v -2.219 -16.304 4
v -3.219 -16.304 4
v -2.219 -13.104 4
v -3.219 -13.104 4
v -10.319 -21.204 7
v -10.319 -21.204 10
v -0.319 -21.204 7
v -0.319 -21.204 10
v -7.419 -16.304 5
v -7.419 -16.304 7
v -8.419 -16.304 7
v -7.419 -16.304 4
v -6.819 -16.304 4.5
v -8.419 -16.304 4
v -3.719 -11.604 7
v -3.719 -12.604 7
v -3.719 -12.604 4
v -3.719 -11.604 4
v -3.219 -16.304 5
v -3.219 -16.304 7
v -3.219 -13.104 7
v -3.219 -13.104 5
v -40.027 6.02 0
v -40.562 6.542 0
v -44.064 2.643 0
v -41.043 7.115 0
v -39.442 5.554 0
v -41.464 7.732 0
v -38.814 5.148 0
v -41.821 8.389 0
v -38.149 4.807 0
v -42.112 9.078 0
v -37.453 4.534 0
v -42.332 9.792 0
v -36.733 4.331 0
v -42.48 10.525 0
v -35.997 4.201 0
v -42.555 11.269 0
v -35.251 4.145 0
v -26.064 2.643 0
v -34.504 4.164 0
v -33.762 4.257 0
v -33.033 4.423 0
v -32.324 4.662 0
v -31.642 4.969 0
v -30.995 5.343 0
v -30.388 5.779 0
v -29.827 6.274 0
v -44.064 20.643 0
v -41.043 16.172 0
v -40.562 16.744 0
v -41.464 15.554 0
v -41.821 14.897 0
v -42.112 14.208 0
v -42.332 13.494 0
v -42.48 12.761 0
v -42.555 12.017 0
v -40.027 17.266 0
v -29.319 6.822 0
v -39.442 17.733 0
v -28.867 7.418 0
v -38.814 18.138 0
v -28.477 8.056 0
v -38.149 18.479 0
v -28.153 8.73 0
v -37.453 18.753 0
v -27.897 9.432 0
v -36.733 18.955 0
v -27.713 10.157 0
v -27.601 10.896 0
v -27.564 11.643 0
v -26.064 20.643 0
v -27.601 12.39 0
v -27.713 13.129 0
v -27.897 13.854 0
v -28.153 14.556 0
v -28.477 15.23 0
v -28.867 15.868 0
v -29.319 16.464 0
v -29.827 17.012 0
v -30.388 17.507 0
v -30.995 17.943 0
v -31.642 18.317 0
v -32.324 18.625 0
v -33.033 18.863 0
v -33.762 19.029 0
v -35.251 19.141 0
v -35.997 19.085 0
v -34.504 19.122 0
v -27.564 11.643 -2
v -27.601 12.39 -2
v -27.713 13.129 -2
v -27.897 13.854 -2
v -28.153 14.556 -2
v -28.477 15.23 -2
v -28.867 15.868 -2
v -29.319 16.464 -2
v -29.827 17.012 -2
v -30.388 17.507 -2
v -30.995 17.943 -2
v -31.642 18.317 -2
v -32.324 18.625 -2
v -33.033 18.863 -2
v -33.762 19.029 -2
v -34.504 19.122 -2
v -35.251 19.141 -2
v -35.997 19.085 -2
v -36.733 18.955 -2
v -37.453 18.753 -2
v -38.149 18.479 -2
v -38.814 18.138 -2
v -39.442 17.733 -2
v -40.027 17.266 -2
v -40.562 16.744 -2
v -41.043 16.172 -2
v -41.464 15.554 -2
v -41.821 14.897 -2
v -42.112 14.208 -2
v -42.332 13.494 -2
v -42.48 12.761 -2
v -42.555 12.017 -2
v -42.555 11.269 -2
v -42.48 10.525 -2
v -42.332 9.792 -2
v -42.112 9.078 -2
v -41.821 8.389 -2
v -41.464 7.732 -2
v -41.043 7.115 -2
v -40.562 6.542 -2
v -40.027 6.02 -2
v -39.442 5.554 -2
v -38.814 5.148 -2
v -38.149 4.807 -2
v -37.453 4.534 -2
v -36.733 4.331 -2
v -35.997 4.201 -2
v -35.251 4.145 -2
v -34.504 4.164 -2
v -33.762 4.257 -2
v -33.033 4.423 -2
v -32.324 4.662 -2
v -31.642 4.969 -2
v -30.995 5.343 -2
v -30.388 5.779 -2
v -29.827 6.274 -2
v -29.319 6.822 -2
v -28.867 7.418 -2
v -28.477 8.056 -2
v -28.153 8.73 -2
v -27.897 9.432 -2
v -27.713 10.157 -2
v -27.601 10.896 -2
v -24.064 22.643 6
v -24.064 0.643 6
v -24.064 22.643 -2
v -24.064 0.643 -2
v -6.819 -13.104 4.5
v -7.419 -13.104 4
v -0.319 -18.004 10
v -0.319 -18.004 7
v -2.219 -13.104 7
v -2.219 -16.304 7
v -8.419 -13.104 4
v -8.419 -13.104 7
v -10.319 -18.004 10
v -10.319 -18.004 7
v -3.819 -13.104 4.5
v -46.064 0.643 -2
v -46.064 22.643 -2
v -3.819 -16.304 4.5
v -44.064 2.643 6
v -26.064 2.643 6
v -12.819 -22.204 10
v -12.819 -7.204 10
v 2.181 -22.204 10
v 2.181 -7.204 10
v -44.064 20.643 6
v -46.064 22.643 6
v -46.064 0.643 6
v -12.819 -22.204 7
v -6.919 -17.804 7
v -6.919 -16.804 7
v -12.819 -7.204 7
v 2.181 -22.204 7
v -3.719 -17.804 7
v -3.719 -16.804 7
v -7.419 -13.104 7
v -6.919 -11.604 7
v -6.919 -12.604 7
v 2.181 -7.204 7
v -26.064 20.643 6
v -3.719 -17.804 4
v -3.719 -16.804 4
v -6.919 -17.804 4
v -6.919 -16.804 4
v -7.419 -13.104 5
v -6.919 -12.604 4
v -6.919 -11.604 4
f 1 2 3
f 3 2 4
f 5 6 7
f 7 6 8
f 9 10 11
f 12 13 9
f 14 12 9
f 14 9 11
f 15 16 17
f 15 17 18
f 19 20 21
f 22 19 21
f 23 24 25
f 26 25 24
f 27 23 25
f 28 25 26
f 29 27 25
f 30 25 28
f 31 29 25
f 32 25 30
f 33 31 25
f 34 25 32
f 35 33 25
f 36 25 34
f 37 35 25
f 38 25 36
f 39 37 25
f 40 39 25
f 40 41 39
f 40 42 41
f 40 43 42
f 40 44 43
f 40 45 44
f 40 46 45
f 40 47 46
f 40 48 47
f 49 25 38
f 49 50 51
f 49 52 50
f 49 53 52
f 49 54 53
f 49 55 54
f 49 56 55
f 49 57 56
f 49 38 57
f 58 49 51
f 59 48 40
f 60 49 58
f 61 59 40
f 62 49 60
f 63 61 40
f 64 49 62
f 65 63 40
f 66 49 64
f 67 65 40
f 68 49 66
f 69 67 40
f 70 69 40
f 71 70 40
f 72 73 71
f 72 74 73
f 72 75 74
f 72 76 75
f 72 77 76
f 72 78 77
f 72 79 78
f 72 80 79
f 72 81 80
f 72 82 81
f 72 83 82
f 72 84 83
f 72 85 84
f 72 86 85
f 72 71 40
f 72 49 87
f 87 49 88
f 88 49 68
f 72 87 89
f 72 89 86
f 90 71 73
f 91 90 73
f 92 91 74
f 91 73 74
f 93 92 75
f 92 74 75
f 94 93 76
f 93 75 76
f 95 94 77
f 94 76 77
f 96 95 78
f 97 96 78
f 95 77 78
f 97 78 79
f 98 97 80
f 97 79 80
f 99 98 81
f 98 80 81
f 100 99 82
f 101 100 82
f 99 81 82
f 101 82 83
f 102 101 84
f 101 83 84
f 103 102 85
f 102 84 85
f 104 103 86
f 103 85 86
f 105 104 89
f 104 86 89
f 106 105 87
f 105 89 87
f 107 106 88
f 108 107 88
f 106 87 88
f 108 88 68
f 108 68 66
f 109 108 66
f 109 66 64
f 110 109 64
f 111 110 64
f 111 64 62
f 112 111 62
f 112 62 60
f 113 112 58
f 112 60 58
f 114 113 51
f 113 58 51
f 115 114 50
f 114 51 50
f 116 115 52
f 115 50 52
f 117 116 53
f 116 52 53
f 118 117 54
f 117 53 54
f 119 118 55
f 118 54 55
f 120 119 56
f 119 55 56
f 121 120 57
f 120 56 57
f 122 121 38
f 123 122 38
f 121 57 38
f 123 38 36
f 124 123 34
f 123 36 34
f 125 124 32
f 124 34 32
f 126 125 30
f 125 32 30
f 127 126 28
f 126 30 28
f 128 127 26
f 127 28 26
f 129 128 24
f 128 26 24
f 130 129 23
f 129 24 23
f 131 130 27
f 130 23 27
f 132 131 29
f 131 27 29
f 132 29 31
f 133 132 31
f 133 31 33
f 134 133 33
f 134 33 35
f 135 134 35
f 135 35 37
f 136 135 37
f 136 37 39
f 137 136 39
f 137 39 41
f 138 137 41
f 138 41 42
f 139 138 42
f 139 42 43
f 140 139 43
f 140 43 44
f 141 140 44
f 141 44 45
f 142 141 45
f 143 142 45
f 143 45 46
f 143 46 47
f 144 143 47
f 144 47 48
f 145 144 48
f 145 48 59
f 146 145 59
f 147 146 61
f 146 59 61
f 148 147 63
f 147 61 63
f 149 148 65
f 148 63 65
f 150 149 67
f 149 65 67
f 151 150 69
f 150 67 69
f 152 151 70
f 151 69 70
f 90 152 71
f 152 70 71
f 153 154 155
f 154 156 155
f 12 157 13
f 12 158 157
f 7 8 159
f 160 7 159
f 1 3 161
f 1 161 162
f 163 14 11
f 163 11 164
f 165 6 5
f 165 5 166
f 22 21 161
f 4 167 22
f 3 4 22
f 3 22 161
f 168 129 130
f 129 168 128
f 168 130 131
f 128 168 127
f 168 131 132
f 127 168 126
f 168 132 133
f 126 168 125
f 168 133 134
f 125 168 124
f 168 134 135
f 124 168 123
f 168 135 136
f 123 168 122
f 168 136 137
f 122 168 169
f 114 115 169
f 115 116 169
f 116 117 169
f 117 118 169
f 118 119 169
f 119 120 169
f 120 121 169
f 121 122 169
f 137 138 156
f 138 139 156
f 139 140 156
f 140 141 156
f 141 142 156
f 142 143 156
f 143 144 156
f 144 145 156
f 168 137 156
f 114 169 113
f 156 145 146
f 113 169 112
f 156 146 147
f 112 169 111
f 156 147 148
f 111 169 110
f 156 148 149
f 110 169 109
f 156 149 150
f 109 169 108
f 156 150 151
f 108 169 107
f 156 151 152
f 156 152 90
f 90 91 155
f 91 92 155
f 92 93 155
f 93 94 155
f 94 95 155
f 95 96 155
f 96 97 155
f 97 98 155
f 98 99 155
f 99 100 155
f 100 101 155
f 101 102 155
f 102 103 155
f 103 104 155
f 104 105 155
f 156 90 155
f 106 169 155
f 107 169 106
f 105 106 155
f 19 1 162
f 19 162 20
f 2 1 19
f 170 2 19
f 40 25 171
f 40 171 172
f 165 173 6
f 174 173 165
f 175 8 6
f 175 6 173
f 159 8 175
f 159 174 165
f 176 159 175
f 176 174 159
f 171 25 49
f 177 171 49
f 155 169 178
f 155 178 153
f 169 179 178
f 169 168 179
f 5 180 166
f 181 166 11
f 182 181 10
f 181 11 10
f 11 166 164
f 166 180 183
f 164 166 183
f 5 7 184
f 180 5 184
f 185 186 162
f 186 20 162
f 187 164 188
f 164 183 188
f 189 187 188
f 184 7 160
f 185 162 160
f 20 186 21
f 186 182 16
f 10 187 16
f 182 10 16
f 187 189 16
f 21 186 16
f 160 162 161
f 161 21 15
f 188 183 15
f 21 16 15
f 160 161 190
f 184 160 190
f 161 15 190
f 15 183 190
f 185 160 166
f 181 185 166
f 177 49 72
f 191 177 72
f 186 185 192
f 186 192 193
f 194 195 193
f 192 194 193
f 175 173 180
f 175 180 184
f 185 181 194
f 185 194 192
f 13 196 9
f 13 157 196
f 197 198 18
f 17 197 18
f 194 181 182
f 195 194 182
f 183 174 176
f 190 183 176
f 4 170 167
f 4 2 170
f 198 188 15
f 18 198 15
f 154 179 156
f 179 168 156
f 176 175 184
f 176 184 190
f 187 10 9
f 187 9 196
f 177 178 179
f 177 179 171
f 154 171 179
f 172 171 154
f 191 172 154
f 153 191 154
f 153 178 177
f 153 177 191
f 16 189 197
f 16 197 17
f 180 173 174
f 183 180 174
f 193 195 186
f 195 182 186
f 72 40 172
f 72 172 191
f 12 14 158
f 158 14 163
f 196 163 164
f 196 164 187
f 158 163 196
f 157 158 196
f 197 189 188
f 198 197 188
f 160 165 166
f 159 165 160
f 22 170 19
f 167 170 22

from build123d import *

# Parameters (mm, degrees)
F0_W       = 22
F0_H       = 22
F0_W_2     = 18
F0_H_2     = 18
F0_R       = 7.5
F1_DEPTH   = 2
F2_DEPTH   = 6
F5_W       = 15
F5_H       = 15
F5_W_2     = 10
F5_H_2     = 3.2
F13_DEPTH  = 3
F7_W       = 3.2
F7_H       = 1
F7_W_2     = 1
F7_H_2     = 3.2
F14_DEPTH  = 2
F14_FACE_W = 1
F14_FACE_H = 3.2
F10_W      = 1.6
F10_H      = 3.2
F17_DEPTH  = 0.5
F15_FACE_W = 1.6
F15_FACE_H = 3.2
F12_W      = 1
F12_H      = 3.2
F16_FACE_W = 1.6
F16_FACE_H = 3.2
F20_DEPTH  = 0.5


# Not quite as in the source:
# - a feature names something its author has since deleted; it is built from what else it names


with BuildPart() as f1:
    # F0 (on Top) → F1 (new body)
    with BuildSketch(Plane.XY):
        with Locations((-35.0640561283, 11.6431117058)):
            Rectangle(F0_W, F0_H)
        with Locations((-35.0640561283, 11.6431117058)):
            Rectangle(F0_W_2, F0_H_2, mode=Mode.SUBTRACT)
        with Locations((-35.0640561283, 11.6431117058)):
            Rectangle(F0_W_2, F0_H_2)
        with Locations((-35.0640561283, 11.6431117058)):
            Circle(F0_R, mode=Mode.SUBTRACT)
    extrude(amount=-F1_DEPTH)

    # F0 (on Top) → F2 (join)
    with BuildSketch(Plane.XY):
        with Locations((-35.0640561283, 11.6431117058)):
            Rectangle(F0_W, F0_H)
        with Locations((-35.0640561283, 11.6431117058)):
            Rectangle(F0_W_2, F0_H_2, mode=Mode.SUBTRACT)
    extrude(amount=F2_DEPTH)


with BuildPart() as f13:
    # F5 (on offset) → F13 (new body, through all)
    with BuildSketch(Plane.XY.offset(10)):
        with Locations((-5.3186413549, -14.7037236601)):
            Rectangle(F5_W, F5_H)
        with Locations((-5.3186413549, -19.6037236601)):
            Rectangle(F5_W_2, F5_H_2, mode=Mode.SUBTRACT)
    extrude(amount=-F13_DEPTH)

    # F7 (on offset) → F14 (join, through all)
    with BuildSketch(Plane.XY.offset(7)):
        with Locations((-5.3186413549, -12.1037236601)):
            Rectangle(F7_W, F7_H)
        with Locations((-2.7186413549, -14.7037236601)):
            Rectangle(F7_W_2, F7_H_2)
        with Locations((-5.3186413549, -17.3037236601)):
            Rectangle(F7_W, F7_H)
        with Locations((-7.9186413549, -14.7037236601)):
            Rectangle(F7_W_2, F7_H_2)
    extrude(amount=-F14_DEPTH)

    # F14_face (on face) → F15 section 0
    with BuildSketch(Plane(origin=(-2.7186413549, -14.7037236601, 5), x_dir=(1, 0, 0), z_dir=(0, 0, -1))):
        Rectangle(F14_FACE_W, F14_FACE_H)
    # F10 (on offset) → F15 section 1
    with BuildSketch(Plane.XY.offset(4.5)):
        with Locations((-3.0186413549, -14.7037236601)):
            Rectangle(F10_W, F10_H)
    loft()

    # F14_face (on face) → F16 section 0
    with BuildSketch(Plane(origin=(-2.7186413549, -14.7037236601, 5), x_dir=(1, 0, 0), z_dir=(0, 0, -1))):
        with Locations((-5.2, 0)):
            Rectangle(F14_FACE_W, F14_FACE_H)
    # F10 (on offset) → F16 section 1
    with BuildSketch(Plane.XY.offset(4.5)):
        with Locations((-7.6186413549, -14.7037236601)):
            Rectangle(F10_W, F10_H)
    loft()

    # F17 (add, through all): faces of the model
    f17_faces = [f13.faces().sort_by_distance(p)[0] for p in [
        (-5.3186413549, -12.1037236601, 5),
        (-5.3186413549, -17.3037236601, 5),
    ]]
    extrude(f17_faces, amount=F17_DEPTH)

    # F15_face (on face) → F18 section 0
    with BuildSketch(Plane(origin=(-3.0186413549, -14.7037236601, 4.5), x_dir=(1, 0, 0), z_dir=(0, 0, -1))):
        Rectangle(F15_FACE_W, F15_FACE_H)
    # F12 (on offset) → F18 section 1
    with BuildSketch(Plane.XY.offset(4)):
        with Locations((-2.7186413549, -14.7037236601)):
            Rectangle(F12_W, F12_H)
    loft()

    # F16_face (on face) → F19 section 0
    with BuildSketch(Plane(origin=(-7.6186413549, -14.7037236601, 4.5), x_dir=(1, 0, 0), z_dir=(0, 0, -1))):
        Rectangle(F16_FACE_W, F16_FACE_H)
    # F12 (on offset) → F19 section 1
    with BuildSketch(Plane.XY.offset(4)):
        with Locations((-7.9186413549, -14.7037236601)):
            Rectangle(F12_W, F12_H)
    loft()

    # F20 (add, through all): faces of the model
    f20_faces = [f13.faces().sort_by_distance(p)[0] for p in [
        (-5.3186413549, -17.3037236601, 4.5),
        (-5.3186413549, -12.1037236601, 4.5),
    ]]
    extrude(f20_faces, amount=F20_DEPTH)


solid = Compound([f1.part, f13.part])
